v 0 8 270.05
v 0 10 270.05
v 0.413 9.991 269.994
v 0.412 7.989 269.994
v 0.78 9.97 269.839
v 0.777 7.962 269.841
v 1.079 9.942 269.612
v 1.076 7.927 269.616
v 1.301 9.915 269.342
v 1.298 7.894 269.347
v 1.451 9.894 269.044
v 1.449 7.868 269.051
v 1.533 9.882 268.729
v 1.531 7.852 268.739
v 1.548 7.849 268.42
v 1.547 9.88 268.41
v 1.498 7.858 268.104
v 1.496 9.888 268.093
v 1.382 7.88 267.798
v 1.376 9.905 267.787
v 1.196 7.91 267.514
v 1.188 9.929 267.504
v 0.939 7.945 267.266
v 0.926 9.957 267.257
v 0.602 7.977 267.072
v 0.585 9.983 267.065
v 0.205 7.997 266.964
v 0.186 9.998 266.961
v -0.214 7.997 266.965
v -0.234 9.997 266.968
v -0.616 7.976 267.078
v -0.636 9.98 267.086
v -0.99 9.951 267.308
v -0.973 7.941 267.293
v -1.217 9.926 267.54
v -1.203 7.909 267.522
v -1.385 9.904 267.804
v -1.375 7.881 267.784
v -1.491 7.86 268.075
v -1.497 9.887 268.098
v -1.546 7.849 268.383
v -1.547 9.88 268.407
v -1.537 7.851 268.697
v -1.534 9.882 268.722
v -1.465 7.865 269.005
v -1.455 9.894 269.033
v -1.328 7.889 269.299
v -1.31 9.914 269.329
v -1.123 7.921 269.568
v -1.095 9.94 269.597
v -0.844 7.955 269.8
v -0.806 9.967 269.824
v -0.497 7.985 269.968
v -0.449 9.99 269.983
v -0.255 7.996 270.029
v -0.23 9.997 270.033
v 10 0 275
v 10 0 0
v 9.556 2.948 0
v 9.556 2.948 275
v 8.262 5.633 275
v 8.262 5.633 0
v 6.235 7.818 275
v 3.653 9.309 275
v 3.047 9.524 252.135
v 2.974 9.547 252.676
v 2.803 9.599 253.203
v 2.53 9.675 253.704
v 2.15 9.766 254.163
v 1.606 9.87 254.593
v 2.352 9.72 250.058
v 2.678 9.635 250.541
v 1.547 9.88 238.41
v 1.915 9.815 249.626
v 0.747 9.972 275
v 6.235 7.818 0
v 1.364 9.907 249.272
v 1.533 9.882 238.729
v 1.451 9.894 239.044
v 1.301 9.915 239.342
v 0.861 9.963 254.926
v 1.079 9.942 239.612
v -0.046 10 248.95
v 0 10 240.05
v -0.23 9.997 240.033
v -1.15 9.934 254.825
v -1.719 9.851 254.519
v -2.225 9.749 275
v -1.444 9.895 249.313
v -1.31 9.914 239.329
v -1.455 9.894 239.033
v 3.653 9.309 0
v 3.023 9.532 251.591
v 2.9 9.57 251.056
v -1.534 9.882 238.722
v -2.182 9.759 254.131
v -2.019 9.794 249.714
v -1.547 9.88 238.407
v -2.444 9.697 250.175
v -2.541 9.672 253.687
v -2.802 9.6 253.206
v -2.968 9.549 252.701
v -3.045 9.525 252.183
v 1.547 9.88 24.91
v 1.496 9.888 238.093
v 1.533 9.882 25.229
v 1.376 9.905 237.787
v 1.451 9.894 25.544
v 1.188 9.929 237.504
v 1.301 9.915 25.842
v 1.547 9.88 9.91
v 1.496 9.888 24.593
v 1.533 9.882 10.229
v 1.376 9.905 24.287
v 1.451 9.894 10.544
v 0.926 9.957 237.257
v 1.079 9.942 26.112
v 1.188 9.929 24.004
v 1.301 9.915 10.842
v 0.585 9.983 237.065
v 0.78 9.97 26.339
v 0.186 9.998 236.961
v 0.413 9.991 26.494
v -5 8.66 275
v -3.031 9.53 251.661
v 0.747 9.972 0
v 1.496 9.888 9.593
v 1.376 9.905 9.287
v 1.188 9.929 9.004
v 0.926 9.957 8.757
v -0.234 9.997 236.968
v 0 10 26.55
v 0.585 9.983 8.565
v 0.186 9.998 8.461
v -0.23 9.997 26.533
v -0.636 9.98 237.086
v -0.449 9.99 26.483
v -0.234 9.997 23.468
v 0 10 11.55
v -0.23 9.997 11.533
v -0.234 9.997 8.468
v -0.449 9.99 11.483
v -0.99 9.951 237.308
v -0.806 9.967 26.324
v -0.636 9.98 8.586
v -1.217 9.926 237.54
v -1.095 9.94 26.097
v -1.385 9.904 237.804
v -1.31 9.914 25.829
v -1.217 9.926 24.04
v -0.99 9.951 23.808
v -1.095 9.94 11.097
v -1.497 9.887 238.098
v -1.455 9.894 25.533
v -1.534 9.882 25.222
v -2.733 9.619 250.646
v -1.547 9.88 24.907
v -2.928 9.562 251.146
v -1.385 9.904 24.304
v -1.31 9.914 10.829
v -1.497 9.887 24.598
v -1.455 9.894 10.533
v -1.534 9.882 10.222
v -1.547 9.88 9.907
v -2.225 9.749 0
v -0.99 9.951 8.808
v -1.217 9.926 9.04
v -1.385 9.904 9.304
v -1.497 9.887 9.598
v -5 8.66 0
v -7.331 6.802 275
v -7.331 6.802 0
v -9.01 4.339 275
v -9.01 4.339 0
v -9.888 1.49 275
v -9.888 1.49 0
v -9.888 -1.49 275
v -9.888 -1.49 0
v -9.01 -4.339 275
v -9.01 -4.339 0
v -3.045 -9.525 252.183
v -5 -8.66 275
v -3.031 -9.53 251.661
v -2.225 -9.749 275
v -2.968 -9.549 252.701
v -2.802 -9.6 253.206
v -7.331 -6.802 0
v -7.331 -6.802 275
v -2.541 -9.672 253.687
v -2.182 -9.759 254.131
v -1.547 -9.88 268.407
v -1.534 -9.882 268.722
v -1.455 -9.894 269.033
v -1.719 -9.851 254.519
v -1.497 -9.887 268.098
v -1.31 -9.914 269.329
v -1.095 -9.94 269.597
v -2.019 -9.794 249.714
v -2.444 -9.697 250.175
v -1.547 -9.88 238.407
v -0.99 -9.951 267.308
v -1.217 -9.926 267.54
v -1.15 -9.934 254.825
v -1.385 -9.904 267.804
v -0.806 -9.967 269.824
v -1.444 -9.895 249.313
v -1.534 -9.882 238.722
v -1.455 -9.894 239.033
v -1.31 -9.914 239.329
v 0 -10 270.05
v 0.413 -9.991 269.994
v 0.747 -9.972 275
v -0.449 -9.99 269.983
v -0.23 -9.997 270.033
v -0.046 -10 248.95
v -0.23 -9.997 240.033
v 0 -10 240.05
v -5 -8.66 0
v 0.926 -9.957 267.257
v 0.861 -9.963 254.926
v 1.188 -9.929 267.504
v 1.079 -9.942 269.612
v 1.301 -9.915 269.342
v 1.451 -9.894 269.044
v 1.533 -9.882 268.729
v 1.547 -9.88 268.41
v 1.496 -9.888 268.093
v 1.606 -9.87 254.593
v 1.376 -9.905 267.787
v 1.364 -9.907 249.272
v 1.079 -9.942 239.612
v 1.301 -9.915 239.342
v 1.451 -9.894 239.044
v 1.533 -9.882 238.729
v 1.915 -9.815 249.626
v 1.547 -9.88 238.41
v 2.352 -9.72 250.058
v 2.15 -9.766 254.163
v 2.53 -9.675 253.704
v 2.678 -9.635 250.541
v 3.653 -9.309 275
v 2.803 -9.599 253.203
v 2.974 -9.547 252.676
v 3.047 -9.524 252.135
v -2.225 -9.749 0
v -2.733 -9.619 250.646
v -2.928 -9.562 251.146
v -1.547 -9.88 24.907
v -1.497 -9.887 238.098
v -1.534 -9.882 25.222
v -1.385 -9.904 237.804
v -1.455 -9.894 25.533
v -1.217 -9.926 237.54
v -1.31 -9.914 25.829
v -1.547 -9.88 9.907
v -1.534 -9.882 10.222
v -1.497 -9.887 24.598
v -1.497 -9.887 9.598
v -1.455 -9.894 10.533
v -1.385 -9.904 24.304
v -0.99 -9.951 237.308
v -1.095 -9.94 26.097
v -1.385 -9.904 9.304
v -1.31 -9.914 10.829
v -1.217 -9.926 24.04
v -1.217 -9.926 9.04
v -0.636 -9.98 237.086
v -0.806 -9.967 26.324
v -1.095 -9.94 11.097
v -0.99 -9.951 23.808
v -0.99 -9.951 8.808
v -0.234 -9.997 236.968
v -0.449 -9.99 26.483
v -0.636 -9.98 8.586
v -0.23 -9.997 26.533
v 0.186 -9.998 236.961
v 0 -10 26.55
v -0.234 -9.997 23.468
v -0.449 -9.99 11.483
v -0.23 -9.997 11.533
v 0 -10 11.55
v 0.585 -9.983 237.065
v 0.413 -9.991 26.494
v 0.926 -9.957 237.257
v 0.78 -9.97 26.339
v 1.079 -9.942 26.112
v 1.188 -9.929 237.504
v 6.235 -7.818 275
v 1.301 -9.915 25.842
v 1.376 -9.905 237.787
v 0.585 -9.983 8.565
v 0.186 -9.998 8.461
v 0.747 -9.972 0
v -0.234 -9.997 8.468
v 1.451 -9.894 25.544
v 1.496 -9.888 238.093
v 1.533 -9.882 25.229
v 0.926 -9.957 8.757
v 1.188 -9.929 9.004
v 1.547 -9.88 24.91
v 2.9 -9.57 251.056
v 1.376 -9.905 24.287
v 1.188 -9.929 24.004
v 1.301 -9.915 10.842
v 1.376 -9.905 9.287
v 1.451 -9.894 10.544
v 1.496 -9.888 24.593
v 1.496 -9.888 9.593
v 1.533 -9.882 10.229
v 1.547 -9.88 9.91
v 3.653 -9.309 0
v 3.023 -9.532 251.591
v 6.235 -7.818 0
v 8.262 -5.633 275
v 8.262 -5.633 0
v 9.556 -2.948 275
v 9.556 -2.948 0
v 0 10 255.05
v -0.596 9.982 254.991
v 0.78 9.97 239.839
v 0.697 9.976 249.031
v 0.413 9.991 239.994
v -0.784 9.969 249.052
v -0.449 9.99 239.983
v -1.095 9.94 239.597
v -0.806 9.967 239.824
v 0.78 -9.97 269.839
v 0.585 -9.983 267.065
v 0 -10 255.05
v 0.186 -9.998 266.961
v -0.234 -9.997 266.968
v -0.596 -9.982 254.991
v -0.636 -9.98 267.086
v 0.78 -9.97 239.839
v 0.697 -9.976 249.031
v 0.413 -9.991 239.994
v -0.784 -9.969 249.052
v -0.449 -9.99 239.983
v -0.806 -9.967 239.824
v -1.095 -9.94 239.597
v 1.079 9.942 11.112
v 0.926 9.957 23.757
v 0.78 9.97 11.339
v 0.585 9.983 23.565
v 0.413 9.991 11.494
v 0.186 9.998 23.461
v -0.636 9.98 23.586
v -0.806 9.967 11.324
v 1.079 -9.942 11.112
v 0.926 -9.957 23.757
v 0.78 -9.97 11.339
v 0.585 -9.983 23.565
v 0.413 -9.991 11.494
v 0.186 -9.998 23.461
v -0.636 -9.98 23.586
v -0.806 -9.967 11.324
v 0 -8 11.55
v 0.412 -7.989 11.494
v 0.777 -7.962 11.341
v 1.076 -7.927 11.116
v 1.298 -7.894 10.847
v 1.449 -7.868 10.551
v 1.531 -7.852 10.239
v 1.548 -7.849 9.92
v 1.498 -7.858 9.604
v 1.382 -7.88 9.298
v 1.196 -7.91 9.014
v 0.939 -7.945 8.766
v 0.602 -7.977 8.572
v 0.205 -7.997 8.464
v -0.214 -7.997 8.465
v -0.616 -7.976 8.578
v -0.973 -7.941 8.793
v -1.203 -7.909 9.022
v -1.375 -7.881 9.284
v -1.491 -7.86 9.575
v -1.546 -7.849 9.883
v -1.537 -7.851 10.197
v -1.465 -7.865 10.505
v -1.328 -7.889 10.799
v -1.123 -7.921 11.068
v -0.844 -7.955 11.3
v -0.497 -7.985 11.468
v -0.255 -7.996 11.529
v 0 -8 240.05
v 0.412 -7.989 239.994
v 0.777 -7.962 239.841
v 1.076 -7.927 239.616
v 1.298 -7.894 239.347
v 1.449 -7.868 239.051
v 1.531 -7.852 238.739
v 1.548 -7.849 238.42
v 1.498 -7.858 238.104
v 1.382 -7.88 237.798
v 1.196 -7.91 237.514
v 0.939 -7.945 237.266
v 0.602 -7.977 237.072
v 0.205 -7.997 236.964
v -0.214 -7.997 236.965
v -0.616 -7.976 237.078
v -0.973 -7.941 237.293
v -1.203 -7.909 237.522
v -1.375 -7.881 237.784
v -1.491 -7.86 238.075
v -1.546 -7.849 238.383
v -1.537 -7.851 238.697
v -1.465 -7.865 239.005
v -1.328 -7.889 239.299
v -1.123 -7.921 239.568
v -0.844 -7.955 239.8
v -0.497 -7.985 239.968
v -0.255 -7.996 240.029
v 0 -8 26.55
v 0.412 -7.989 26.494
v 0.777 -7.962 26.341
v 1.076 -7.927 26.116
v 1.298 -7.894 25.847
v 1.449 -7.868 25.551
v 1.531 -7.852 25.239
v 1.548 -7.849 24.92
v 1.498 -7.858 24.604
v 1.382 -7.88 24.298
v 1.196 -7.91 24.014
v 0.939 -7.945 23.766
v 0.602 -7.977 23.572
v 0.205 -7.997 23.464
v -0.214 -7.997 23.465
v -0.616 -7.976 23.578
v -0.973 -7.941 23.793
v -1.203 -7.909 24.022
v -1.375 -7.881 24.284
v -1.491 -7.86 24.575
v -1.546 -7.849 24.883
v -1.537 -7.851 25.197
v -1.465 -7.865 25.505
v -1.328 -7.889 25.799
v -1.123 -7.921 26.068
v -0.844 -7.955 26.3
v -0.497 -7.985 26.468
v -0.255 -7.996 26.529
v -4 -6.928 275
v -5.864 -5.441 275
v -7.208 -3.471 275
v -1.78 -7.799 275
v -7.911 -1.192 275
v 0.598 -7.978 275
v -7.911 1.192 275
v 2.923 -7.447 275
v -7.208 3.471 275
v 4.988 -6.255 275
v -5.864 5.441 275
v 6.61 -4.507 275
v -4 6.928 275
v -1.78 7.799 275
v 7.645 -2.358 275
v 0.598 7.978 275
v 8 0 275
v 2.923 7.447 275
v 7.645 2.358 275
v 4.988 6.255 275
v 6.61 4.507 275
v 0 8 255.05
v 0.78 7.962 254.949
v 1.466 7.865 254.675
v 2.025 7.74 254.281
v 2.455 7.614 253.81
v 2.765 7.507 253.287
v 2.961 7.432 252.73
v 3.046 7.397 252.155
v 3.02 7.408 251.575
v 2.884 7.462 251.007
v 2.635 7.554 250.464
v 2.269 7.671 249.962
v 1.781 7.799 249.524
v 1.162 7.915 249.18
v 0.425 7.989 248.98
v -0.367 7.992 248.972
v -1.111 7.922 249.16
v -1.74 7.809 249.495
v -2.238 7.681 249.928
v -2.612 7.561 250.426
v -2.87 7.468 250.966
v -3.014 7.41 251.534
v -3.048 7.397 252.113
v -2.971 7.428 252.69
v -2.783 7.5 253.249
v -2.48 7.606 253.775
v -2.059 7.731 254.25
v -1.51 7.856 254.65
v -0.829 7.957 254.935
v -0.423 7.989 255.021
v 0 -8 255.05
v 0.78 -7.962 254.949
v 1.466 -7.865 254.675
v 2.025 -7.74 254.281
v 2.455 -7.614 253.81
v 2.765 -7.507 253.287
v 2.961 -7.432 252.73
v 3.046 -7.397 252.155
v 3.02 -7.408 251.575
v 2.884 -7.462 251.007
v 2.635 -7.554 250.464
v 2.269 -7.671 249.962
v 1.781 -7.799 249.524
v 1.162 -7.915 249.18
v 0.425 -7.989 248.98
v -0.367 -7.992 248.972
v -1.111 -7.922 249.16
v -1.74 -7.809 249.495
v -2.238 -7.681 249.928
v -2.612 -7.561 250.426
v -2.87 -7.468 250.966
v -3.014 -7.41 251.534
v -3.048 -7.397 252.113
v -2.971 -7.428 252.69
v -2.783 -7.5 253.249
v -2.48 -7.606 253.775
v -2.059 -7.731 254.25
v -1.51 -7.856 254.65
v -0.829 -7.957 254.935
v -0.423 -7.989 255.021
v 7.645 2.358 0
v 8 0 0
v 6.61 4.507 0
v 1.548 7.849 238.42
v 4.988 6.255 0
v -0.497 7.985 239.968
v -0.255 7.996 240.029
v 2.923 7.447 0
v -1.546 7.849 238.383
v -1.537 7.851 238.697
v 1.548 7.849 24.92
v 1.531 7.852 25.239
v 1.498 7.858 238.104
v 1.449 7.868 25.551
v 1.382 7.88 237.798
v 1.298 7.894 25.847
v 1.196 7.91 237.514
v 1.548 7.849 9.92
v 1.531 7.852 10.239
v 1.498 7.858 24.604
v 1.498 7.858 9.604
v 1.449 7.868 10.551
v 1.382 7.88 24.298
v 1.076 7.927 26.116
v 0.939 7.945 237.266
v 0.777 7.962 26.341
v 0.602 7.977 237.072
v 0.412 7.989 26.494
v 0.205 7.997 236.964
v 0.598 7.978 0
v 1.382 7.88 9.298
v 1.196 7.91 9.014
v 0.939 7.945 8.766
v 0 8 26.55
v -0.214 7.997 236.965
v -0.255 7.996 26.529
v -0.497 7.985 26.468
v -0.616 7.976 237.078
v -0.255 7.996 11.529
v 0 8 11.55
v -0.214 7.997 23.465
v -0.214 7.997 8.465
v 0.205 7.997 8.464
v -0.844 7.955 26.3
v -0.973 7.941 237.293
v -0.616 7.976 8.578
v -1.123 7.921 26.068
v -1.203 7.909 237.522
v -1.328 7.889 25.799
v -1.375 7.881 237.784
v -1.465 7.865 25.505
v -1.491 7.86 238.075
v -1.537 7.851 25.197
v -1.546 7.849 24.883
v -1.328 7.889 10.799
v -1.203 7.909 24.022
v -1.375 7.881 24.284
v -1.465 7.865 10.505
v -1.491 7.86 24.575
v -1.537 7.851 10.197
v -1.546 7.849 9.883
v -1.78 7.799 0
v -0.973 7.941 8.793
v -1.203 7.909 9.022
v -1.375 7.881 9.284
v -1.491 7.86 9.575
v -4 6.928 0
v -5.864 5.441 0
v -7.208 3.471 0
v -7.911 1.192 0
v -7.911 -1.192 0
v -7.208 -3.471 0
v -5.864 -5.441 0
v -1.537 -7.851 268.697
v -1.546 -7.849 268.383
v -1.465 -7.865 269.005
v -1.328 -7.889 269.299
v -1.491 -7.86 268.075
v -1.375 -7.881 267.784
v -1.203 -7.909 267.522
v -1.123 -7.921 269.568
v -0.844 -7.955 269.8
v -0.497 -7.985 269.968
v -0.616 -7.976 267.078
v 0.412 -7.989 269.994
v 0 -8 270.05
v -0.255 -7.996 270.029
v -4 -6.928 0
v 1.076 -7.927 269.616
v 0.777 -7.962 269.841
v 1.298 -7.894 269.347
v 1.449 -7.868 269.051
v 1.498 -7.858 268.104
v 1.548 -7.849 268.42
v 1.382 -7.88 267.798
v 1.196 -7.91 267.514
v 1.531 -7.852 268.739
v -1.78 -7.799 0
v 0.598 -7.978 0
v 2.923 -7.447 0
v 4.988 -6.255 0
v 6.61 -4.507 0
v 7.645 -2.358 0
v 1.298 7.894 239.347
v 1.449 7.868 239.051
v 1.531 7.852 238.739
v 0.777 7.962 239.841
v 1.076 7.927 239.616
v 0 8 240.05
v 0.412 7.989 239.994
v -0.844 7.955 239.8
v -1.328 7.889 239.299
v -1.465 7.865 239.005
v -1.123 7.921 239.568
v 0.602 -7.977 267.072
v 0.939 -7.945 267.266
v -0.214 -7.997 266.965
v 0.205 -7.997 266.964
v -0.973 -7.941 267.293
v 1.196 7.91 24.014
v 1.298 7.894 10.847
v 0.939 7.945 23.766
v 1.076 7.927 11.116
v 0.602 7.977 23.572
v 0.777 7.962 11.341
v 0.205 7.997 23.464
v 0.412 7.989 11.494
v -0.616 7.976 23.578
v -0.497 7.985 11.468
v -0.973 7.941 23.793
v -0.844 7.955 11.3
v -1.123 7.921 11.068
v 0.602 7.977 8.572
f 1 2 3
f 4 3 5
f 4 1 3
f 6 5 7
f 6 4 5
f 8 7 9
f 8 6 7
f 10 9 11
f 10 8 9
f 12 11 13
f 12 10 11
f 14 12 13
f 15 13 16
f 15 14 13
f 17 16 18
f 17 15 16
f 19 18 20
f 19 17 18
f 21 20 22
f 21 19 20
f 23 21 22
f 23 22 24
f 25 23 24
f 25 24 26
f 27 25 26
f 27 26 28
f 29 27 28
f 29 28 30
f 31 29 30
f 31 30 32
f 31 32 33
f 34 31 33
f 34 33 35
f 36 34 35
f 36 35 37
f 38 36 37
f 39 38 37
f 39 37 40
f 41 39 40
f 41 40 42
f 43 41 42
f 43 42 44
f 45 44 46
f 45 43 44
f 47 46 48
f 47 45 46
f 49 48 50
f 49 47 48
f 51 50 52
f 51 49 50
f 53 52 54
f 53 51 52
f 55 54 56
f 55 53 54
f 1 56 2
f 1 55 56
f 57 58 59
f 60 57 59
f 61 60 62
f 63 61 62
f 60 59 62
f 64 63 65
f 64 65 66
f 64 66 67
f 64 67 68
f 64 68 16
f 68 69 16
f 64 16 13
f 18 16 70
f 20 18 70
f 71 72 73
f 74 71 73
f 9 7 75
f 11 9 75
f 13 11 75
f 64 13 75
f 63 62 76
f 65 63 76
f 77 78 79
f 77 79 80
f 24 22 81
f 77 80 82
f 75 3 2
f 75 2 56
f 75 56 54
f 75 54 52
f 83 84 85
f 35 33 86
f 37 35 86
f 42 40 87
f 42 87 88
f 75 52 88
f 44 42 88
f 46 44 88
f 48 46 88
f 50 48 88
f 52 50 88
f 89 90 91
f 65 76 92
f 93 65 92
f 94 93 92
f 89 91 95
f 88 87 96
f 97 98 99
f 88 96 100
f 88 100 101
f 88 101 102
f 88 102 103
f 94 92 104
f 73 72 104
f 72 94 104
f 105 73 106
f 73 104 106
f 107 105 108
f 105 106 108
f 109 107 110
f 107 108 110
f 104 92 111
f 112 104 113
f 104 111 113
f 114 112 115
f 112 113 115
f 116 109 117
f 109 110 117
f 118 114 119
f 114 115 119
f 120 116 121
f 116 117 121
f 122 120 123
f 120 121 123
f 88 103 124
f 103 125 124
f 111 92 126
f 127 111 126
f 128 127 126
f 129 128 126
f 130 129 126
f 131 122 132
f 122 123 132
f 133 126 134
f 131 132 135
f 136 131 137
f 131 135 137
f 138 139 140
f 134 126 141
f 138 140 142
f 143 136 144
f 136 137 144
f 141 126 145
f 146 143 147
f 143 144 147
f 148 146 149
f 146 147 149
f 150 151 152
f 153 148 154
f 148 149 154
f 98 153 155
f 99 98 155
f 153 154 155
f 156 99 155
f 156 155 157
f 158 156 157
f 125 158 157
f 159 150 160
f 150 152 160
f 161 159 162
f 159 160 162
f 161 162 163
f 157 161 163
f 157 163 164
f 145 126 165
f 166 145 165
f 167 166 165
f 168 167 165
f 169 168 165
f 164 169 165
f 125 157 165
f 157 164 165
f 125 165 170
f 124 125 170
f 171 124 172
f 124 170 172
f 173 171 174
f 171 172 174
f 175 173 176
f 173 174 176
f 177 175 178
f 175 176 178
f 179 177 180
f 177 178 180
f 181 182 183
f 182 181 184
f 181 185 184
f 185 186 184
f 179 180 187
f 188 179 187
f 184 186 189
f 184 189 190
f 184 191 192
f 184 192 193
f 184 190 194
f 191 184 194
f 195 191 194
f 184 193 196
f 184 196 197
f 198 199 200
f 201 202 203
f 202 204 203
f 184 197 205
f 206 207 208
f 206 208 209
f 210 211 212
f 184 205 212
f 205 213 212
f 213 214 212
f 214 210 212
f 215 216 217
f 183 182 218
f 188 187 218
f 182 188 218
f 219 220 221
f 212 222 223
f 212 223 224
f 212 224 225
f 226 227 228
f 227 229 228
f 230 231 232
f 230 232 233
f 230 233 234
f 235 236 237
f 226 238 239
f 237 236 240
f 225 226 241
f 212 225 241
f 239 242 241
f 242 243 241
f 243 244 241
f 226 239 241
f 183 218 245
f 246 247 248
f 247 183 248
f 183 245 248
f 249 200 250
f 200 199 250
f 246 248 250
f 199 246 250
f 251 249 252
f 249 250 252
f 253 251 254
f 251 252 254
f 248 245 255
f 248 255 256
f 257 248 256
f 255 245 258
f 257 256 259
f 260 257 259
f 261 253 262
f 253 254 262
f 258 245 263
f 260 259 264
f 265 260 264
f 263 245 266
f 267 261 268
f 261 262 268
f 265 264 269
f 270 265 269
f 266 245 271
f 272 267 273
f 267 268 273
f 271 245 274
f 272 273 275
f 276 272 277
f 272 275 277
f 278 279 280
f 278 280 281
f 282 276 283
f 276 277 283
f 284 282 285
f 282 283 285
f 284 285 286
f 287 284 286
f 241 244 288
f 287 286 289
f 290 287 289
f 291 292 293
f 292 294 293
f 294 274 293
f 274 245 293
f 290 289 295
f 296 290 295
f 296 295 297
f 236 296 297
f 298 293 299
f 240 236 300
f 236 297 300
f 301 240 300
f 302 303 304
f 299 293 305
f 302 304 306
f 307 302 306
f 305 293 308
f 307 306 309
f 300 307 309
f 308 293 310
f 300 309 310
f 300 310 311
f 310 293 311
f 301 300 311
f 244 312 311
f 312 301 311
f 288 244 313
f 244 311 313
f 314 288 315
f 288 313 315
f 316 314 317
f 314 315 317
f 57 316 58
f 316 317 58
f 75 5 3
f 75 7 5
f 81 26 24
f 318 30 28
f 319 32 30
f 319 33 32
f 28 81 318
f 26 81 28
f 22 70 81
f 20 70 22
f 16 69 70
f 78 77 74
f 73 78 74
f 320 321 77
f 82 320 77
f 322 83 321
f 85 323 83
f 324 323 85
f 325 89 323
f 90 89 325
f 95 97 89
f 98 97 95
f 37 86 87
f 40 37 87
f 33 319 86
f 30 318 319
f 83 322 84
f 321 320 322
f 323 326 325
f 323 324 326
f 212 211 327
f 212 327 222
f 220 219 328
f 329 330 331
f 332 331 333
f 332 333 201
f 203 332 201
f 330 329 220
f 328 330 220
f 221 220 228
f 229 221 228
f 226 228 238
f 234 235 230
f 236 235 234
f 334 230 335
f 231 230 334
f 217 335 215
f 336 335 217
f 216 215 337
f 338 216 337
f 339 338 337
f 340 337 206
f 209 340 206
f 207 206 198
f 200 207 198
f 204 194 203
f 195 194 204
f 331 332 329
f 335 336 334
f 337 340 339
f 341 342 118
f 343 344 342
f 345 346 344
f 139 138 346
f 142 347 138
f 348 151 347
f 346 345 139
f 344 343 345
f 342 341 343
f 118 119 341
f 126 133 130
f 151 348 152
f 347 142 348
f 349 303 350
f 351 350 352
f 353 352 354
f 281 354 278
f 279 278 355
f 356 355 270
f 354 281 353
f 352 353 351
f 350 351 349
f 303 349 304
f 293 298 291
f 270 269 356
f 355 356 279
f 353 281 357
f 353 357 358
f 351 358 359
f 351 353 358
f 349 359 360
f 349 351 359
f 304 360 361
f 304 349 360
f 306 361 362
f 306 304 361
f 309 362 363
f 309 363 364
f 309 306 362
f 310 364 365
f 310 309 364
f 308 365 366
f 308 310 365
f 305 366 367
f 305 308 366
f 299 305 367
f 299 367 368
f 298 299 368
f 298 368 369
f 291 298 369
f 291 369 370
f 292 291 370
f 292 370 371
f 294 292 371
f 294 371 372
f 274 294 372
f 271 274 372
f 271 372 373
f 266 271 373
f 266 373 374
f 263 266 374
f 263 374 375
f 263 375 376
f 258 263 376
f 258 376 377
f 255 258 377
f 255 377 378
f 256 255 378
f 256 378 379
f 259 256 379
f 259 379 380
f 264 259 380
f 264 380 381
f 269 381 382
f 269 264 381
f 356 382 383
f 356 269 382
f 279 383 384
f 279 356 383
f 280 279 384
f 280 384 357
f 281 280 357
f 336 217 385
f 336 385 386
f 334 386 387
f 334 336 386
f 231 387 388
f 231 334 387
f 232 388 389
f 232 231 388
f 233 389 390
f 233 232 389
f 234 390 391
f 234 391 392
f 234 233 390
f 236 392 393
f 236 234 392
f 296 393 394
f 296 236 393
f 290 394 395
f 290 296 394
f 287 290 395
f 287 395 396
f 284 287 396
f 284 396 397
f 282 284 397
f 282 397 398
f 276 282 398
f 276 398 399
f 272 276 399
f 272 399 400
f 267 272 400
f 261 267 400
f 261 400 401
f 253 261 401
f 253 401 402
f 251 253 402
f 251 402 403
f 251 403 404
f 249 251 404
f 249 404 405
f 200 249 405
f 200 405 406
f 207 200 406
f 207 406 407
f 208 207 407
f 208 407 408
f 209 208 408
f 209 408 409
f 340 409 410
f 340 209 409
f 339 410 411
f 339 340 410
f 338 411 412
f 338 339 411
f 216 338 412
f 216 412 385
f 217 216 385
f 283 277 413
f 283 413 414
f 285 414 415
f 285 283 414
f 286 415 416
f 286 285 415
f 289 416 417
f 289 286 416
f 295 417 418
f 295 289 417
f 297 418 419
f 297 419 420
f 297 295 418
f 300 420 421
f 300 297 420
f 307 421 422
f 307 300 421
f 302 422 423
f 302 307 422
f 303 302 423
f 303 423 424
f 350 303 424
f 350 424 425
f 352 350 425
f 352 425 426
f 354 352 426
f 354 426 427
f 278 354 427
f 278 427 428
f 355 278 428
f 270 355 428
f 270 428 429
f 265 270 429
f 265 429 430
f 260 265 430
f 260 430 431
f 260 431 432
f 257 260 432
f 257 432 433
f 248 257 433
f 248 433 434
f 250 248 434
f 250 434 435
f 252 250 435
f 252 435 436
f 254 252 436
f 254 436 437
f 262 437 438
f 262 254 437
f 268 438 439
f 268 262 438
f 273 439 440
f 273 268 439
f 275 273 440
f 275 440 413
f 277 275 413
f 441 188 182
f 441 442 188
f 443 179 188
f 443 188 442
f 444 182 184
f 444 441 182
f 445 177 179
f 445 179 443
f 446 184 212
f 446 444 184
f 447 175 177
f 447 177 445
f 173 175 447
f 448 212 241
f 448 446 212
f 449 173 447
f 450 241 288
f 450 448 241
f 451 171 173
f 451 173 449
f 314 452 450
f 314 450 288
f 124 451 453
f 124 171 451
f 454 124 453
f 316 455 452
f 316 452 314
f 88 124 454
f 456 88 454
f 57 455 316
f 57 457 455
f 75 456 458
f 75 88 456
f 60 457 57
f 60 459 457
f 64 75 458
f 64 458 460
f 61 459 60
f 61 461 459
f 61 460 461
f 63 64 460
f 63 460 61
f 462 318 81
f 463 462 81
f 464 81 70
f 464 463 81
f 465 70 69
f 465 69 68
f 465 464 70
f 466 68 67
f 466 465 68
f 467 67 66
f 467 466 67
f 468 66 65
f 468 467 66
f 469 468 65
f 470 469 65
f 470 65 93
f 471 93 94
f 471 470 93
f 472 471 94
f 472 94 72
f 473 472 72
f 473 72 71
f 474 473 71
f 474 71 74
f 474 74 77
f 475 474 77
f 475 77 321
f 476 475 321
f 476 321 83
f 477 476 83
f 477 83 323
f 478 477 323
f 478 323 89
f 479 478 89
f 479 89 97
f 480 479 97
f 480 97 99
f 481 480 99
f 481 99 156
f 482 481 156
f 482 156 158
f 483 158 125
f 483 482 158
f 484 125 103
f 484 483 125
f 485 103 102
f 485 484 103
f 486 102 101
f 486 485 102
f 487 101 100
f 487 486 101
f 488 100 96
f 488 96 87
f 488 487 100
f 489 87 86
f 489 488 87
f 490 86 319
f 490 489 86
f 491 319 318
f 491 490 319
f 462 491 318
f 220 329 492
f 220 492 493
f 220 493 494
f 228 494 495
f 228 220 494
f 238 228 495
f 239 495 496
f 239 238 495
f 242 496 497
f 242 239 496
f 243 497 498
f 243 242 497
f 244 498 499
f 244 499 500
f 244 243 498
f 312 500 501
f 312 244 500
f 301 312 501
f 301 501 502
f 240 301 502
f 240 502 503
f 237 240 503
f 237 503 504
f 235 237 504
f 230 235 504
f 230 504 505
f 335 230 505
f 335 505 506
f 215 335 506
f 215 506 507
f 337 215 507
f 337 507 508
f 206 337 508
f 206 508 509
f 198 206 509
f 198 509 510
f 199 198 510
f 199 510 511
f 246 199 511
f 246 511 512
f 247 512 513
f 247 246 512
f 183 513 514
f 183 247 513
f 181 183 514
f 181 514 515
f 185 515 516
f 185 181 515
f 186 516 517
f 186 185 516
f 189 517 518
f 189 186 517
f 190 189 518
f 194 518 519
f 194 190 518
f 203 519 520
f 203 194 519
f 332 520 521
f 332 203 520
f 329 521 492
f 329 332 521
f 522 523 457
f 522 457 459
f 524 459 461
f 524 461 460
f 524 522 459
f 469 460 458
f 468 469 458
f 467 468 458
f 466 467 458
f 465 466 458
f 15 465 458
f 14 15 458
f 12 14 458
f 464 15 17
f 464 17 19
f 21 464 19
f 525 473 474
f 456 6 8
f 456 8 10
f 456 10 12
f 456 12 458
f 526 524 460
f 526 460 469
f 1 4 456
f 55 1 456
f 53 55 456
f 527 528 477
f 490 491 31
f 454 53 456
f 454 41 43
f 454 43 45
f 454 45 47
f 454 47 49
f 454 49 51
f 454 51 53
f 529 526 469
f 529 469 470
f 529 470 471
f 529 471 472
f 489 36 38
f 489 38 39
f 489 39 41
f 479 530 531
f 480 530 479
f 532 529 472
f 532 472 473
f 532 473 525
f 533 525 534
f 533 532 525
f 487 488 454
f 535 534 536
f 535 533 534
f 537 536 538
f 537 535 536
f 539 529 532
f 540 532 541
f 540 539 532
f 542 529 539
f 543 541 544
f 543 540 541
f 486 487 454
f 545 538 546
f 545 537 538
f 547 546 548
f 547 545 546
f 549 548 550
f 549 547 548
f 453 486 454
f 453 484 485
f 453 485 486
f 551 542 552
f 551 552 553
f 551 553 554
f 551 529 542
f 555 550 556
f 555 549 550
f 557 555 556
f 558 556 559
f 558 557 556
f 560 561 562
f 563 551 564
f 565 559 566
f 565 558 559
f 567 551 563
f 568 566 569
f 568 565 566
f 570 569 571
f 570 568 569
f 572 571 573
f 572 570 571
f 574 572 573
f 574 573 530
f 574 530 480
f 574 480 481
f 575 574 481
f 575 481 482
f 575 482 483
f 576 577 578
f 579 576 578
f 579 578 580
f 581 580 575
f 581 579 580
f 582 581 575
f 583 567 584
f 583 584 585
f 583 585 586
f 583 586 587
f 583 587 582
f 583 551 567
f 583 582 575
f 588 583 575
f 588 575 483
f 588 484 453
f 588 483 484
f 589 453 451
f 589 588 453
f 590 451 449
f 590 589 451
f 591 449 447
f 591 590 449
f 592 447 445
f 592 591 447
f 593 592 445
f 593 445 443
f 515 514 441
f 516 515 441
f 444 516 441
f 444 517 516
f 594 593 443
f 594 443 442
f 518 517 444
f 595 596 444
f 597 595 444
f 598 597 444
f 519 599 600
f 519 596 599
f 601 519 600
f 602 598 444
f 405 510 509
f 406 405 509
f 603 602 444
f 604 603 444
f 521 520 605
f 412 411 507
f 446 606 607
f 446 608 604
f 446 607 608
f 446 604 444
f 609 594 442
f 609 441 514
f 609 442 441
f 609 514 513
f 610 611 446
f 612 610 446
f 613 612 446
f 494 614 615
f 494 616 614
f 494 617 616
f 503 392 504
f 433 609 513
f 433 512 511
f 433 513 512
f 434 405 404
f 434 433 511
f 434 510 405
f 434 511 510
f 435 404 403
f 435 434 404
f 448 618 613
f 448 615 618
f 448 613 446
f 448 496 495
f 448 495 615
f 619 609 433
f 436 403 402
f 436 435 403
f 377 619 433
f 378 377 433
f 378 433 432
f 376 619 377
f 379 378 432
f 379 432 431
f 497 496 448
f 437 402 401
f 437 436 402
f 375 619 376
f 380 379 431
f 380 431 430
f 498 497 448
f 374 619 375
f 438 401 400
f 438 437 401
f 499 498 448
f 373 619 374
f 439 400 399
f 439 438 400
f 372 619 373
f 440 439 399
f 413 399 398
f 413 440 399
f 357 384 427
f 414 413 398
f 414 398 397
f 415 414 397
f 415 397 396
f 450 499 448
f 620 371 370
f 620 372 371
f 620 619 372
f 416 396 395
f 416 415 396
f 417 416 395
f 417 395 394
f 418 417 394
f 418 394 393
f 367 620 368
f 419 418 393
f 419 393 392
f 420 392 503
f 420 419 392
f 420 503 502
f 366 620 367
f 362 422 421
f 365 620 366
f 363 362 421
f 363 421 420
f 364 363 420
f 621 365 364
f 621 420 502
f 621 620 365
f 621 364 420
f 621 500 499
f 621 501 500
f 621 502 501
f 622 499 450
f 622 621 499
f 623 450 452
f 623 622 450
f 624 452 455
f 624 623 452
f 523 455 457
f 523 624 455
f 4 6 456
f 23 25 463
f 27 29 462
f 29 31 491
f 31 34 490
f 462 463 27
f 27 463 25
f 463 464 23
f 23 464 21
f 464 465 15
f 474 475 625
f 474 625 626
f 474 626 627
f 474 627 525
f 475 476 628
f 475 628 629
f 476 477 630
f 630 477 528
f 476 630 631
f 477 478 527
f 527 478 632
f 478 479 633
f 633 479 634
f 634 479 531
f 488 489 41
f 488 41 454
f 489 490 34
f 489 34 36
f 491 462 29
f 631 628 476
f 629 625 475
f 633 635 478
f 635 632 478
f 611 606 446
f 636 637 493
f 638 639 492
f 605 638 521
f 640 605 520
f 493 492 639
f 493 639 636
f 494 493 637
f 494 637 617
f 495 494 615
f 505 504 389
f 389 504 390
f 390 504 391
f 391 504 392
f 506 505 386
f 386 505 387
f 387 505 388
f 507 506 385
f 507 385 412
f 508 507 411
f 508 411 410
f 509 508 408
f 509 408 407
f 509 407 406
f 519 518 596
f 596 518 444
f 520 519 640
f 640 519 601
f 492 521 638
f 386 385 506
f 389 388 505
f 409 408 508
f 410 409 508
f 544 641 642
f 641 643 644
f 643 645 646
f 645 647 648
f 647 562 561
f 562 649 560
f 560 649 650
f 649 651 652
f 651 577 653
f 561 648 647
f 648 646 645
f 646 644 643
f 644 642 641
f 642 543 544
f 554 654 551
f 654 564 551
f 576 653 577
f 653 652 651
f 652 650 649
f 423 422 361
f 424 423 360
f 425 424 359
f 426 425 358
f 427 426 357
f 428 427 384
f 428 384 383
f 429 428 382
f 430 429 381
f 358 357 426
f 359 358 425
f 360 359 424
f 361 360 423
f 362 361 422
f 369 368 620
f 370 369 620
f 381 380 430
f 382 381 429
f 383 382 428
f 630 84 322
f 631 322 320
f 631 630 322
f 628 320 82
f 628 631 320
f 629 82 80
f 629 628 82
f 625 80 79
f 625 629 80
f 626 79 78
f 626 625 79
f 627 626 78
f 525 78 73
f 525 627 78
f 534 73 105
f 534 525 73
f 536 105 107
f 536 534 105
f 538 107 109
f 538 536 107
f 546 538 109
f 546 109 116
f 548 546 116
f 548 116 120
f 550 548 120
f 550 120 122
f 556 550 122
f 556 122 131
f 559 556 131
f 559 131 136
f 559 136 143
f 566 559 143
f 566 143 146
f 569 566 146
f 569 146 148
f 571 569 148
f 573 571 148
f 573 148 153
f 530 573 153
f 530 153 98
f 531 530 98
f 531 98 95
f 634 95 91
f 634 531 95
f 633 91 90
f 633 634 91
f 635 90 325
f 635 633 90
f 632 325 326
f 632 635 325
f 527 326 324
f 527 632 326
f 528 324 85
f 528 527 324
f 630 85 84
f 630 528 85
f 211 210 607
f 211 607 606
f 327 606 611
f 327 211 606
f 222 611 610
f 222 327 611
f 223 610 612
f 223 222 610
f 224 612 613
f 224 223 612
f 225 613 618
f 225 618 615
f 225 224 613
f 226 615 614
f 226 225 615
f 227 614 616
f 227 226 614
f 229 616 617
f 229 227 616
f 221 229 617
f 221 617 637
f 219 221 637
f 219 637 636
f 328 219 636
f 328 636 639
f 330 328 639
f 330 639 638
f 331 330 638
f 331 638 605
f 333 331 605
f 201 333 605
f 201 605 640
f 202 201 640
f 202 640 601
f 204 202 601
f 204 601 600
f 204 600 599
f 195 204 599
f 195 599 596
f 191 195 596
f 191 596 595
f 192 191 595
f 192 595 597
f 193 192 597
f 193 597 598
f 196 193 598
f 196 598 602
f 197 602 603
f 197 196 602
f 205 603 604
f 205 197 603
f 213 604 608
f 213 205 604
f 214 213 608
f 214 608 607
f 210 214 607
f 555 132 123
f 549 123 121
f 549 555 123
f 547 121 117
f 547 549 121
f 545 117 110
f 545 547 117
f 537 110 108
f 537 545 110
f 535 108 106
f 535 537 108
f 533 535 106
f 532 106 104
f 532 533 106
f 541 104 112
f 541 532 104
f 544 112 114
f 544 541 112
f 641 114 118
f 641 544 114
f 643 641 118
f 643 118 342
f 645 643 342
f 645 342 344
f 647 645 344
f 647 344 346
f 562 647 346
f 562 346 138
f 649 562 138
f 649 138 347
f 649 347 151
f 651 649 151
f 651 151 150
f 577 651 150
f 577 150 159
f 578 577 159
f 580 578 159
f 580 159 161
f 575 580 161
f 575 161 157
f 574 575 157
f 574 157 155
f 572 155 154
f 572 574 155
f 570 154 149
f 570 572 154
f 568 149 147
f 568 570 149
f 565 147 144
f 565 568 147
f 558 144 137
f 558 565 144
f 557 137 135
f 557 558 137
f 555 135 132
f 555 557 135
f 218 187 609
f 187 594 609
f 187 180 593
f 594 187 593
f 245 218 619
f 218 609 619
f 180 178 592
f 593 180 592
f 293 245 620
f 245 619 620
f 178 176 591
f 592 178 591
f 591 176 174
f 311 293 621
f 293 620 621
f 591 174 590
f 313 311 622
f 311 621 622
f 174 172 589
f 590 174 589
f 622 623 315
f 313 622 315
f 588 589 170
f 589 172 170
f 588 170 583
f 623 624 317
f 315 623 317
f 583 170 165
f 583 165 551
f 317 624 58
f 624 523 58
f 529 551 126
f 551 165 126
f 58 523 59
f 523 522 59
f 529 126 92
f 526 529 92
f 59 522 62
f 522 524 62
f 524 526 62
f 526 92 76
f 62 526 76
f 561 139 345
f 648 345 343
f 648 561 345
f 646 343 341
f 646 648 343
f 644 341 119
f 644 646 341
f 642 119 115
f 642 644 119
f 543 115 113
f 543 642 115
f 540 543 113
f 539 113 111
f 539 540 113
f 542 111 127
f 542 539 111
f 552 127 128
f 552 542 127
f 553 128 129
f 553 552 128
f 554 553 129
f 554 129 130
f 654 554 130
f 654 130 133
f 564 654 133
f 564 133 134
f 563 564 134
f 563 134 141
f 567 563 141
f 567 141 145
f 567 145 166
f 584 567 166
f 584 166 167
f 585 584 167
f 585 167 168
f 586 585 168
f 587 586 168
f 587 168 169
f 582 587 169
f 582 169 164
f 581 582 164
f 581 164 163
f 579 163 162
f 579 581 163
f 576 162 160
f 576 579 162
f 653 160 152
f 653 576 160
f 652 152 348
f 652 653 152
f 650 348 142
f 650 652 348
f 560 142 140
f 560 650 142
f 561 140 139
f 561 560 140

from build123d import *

# Parameters (mm, degrees)
SKETCH_1_R               = 10
SKETCH_1_R_2             = 8
EXTRUDE_1_DEPTH          = 275
CUT_EXTRUDE_1_DEPTH      = 276.36339626
CUT_EXTRUDE_1_DEPTH_BACK = 276.36339626
SKETCH_4_R               = 1.55
SKETCH_4_R_2             = 3.05


with BuildPart() as part:
    # 草图1 → 凸台-拉伸1 (new body)
    with BuildSketch(Plane.XY):
        Circle(SKETCH_1_R)
        Circle(SKETCH_1_R_2, mode=Mode.SUBTRACT)
    extrude(amount=EXTRUDE_1_DEPTH)

    # 草图4 → 切除-拉伸1 (cut, two sides: drawn at the far end of the back side and taken through both)
    with BuildSketch(Plane(origin=(0, 0, 0), x_dir=(1, 0, 0), z_dir=(0, 1, 0)).offset(-CUT_EXTRUDE_1_DEPTH_BACK)):
        with Locations(Location((0, -268.5, 0), (0, 0, 270))):
            Circle(SKETCH_4_R)
        with Locations(Location((0, -252, 0), (0, 0, 270))):
            Circle(SKETCH_4_R_2)
        with Locations(Location((0, -238.5, 0), (0, 0, 270))):
            Circle(SKETCH_4_R)
        with Locations(Location((0, -25, 0), (0, 0, 270))):
            Circle(SKETCH_4_R)
        with Locations(Location((0, -10, 0), (0, 0, 270))):
            Circle(SKETCH_4_R)
    extrude(amount=CUT_EXTRUDE_1_DEPTH + CUT_EXTRUDE_1_DEPTH_BACK, mode=Mode.SUBTRACT)


solid = part.part
